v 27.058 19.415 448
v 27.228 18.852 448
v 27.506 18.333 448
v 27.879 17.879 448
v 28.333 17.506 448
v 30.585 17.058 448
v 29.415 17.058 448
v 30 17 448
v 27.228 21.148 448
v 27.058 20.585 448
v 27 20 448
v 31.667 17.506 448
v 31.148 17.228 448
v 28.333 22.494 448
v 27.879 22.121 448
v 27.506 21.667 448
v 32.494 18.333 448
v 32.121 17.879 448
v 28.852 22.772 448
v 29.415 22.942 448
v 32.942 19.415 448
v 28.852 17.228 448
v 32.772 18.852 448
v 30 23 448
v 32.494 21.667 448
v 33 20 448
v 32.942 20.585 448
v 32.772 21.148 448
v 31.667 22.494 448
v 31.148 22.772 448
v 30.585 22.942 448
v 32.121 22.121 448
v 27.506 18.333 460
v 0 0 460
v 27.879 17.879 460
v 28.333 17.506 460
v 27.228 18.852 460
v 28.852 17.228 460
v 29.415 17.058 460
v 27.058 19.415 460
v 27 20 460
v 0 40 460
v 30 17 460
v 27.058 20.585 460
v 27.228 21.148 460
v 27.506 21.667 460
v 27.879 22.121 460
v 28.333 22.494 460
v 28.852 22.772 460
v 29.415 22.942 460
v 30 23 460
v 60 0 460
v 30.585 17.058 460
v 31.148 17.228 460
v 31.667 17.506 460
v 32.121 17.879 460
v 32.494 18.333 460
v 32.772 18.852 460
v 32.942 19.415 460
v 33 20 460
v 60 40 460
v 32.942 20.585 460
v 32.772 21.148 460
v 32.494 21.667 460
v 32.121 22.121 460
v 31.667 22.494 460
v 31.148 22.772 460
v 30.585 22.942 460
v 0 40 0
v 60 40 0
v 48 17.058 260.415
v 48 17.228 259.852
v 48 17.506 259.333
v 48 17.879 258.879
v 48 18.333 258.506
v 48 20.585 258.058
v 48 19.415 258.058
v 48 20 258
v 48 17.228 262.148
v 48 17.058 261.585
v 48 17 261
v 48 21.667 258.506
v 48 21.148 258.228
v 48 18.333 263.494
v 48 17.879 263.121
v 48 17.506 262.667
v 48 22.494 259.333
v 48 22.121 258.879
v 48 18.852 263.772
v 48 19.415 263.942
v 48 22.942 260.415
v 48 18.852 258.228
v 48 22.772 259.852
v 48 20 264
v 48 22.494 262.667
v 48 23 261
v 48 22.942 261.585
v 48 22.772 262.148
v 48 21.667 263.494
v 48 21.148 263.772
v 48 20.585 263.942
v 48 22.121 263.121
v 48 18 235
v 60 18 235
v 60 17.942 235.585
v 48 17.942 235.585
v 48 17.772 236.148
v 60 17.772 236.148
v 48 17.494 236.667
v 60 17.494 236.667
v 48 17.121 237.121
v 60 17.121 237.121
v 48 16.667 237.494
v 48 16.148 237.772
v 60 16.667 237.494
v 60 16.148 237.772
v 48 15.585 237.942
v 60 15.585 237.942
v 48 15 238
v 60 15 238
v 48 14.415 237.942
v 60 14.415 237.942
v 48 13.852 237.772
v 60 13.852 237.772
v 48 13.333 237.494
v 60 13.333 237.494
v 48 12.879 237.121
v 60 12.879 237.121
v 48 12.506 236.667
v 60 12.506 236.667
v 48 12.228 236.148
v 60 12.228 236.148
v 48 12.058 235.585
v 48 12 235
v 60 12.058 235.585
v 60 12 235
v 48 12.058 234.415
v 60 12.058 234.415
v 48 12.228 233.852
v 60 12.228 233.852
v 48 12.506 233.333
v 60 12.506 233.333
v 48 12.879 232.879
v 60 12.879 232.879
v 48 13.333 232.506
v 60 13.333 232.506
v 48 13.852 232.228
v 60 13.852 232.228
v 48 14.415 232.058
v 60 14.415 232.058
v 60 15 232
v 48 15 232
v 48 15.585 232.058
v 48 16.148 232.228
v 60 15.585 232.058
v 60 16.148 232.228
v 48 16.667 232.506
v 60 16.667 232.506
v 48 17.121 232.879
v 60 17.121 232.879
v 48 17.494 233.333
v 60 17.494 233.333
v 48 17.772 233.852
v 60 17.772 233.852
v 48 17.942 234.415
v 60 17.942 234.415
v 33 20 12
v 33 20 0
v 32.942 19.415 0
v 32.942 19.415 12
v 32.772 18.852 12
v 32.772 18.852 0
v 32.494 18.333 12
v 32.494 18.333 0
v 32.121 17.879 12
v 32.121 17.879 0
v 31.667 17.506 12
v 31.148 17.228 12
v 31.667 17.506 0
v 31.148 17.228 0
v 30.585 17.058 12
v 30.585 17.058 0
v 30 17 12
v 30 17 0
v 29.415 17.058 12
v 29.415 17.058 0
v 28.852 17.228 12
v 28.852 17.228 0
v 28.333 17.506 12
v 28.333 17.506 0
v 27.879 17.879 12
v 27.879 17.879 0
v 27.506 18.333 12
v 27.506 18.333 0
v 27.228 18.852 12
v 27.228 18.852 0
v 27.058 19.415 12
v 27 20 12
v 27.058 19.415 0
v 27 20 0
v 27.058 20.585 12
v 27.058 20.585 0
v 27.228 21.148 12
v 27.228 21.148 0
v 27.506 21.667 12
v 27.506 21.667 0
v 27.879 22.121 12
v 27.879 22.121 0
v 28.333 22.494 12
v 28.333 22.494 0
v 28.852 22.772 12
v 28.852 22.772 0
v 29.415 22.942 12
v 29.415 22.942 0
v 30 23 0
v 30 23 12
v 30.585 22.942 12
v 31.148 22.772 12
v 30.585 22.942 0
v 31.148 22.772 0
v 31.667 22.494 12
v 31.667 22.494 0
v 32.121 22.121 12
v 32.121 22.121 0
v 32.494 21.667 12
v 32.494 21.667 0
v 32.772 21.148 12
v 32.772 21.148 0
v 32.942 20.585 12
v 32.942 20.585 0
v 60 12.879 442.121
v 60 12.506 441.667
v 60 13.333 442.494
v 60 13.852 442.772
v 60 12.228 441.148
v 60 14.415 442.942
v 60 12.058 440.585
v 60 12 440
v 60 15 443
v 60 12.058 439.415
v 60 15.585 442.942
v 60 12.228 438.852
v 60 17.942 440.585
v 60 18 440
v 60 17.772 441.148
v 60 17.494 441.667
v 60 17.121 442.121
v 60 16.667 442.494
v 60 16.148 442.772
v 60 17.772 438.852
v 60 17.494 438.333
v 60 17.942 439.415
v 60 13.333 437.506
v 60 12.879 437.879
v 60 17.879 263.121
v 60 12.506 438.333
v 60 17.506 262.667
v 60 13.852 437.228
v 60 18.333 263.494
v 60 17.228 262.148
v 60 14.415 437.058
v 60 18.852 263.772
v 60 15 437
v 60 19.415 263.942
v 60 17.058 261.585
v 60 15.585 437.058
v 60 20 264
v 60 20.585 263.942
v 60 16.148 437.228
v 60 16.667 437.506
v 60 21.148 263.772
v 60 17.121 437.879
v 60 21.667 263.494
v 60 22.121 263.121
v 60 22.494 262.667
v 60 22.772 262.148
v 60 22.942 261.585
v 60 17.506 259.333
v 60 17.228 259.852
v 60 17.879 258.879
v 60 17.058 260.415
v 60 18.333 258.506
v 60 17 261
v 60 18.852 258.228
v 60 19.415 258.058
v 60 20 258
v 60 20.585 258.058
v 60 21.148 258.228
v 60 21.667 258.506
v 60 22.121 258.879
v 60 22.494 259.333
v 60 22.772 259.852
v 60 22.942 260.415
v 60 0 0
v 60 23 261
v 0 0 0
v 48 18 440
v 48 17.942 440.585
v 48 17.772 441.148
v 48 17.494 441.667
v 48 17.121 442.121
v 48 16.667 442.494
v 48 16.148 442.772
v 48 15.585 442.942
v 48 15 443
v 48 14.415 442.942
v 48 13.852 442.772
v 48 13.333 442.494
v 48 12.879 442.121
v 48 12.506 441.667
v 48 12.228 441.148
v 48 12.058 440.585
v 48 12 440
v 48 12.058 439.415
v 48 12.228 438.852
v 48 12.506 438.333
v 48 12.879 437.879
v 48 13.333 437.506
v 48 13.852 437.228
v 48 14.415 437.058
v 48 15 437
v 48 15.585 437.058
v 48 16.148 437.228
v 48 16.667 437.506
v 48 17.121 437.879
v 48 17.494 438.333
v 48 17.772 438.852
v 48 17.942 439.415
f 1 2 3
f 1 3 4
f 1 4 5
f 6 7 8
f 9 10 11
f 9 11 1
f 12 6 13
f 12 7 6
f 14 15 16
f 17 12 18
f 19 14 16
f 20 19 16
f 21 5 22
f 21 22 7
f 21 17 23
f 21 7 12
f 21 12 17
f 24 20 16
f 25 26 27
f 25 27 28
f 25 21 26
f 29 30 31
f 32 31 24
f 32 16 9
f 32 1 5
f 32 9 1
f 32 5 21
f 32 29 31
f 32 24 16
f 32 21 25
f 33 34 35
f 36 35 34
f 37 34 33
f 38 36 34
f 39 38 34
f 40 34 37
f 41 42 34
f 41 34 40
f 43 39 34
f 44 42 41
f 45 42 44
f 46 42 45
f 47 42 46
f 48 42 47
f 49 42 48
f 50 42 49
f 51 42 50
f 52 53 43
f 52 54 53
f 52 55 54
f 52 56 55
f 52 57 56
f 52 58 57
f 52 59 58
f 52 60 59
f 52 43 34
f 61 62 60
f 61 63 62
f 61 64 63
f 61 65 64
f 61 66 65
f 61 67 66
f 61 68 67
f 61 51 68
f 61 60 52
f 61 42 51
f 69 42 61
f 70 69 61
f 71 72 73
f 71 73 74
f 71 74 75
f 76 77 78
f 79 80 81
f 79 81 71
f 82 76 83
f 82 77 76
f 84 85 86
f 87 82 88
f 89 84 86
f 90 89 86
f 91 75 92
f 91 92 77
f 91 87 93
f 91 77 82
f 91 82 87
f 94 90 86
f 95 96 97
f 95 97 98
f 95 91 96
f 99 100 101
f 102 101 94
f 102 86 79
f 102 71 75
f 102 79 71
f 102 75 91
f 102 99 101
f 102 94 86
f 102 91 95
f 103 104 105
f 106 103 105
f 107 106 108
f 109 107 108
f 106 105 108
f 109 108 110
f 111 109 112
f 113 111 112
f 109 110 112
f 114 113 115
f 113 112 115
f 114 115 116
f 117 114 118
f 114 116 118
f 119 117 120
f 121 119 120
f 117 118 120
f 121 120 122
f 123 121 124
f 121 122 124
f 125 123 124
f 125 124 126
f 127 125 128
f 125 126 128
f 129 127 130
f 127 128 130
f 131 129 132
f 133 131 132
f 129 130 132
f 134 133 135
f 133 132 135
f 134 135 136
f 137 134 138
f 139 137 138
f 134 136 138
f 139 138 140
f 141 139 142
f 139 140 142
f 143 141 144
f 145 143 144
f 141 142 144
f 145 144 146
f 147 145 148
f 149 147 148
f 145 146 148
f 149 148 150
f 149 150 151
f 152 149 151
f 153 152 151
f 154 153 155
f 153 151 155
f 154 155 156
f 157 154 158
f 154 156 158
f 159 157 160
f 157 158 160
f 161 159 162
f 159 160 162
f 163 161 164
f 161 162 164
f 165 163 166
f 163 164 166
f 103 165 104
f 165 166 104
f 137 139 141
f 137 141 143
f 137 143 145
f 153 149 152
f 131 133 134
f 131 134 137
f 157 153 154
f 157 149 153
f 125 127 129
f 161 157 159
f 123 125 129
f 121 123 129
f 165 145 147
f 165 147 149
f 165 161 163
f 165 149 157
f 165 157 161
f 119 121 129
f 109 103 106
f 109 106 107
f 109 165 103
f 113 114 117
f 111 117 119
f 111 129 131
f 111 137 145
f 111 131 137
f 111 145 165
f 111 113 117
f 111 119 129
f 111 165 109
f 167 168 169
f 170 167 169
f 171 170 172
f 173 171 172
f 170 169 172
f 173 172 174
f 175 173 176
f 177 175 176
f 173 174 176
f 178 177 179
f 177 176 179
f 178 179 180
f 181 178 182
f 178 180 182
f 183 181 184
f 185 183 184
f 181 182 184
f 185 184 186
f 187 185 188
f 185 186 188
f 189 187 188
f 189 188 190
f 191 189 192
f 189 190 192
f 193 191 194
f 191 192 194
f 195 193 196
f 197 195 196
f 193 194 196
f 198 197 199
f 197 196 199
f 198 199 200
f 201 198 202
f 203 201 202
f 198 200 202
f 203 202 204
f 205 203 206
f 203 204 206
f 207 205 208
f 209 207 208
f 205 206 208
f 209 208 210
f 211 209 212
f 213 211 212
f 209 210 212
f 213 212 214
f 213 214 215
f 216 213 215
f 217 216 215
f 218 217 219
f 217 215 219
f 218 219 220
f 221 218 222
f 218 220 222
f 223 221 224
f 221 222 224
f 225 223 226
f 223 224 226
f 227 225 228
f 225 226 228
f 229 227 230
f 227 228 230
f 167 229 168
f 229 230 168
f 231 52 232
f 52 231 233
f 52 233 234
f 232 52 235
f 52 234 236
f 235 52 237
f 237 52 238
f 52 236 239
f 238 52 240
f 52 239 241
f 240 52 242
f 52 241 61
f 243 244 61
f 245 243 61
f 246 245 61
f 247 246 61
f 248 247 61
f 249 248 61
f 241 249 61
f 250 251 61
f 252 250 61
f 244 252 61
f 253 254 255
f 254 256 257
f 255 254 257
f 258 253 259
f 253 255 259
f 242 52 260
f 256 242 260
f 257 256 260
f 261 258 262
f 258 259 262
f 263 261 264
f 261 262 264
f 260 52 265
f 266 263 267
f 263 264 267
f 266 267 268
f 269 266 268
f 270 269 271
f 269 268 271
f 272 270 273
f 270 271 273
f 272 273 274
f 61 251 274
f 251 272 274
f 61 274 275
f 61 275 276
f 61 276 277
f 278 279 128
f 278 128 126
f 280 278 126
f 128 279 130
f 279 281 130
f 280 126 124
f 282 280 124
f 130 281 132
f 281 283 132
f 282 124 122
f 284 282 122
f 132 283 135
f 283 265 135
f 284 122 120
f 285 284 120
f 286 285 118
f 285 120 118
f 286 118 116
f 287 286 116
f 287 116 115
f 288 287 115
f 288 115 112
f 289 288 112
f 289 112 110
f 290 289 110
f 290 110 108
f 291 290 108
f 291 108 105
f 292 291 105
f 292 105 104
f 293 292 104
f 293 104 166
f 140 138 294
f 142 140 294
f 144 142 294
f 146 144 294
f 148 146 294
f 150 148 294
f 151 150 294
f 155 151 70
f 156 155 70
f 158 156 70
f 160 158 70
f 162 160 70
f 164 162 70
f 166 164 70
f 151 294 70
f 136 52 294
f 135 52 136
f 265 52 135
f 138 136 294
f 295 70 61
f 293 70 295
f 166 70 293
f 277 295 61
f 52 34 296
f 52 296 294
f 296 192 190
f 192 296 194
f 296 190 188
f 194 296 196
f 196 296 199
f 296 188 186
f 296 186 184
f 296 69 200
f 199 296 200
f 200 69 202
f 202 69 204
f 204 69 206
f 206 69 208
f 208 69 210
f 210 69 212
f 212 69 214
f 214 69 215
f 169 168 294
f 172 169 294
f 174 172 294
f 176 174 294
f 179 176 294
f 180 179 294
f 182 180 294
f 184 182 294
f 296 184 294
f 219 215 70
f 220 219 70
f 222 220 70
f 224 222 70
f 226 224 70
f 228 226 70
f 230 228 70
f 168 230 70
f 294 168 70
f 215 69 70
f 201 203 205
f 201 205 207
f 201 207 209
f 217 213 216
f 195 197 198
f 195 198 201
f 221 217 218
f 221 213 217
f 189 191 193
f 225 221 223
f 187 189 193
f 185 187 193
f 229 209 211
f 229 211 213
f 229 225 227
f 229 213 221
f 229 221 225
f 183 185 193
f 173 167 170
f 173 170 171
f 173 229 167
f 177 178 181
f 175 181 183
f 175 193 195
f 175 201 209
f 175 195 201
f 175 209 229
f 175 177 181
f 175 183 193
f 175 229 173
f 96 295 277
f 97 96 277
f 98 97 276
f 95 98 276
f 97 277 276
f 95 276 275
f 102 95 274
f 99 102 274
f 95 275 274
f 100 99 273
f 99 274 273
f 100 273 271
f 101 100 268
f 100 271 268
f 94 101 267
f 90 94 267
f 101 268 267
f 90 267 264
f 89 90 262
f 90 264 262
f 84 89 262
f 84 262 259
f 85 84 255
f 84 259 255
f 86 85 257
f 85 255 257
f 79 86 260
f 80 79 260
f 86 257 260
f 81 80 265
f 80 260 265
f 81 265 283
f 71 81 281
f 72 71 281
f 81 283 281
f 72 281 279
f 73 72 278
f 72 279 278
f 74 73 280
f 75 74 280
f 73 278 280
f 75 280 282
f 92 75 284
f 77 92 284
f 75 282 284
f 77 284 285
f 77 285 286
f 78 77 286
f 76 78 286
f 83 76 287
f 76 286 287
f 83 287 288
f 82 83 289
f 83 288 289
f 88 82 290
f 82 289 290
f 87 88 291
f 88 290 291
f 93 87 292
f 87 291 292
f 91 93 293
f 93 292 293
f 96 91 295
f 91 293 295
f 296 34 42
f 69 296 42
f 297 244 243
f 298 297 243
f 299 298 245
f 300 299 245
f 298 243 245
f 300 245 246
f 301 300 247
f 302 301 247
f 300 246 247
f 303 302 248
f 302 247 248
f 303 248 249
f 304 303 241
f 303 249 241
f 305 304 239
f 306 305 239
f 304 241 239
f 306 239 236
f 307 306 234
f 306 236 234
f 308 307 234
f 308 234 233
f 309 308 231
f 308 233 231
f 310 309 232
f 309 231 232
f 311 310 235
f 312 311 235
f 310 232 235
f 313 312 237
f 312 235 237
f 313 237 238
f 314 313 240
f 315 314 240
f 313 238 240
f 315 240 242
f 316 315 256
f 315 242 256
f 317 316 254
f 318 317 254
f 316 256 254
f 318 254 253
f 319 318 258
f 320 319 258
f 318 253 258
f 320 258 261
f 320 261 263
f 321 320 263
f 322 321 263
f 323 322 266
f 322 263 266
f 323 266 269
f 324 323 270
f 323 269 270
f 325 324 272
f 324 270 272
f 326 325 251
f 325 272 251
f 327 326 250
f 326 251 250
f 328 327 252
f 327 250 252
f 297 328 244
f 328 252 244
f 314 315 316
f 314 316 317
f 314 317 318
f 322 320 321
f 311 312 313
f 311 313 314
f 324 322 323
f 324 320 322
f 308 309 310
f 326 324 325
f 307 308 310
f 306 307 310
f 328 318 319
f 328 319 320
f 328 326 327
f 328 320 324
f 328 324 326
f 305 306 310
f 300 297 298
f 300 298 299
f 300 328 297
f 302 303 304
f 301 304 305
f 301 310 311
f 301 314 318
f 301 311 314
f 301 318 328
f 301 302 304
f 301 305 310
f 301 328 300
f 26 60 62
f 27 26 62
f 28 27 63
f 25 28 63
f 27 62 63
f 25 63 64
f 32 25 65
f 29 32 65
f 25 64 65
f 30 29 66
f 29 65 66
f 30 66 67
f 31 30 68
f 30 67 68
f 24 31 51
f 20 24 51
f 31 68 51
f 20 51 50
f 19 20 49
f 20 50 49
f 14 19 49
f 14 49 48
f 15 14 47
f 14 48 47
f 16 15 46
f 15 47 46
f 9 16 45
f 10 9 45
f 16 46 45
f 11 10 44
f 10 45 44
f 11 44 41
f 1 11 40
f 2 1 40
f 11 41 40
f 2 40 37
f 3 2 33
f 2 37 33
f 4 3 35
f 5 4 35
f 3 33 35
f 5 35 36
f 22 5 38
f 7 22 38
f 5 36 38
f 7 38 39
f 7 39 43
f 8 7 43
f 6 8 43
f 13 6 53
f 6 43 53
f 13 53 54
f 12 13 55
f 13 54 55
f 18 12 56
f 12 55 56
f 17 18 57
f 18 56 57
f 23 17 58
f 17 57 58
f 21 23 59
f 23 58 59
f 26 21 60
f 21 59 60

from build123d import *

# Parameters (mm, degrees)
F0_W      = 60
F0_H      = 40
F1_DEPTH  = 460
F2_R      = 3
F3_DEPTH  = 12
F4_R      = 3
F5_DEPTH  = 12
F6_R      = 3
F7_DEPTH  = 12
F8_R      = 3
F9_DEPTH  = 12
F10_R     = 3
F11_DEPTH = 12


with BuildPart() as f1:
    # F0 (on Top) → F1 (new body)
    with BuildSketch(Plane.XY):
        with Locations((30, 20)):
            Rectangle(F0_W, F0_H)
    extrude(amount=F1_DEPTH)

    # F2 (on face) → F3 (cut)
    with BuildSketch(Plane.XY.offset(460)):
        with Locations((30, 20)):
            Circle(F2_R)
    extrude(amount=-F3_DEPTH, mode=Mode.SUBTRACT)

    # F4 (on face) → F5 (cut)
    with BuildSketch(Plane(origin=(0, 0, 0), x_dir=(1, 0, 0), z_dir=(0, 0, -1))):
        with Locations((30, -20)):
            Circle(F4_R)
    extrude(amount=-F5_DEPTH, mode=Mode.SUBTRACT)

    # F6 (on face) → F7 (cut)
    with BuildSketch(Plane.YZ.offset(60)):
        with Locations((20, 261)):
            Circle(F6_R)
    extrude(amount=-F7_DEPTH, mode=Mode.SUBTRACT)

    # F8 (on face) → F9 (cut)
    with BuildSketch(Plane.YZ.offset(60)):
        with Locations((15, 440)):
            Circle(F8_R)
    extrude(amount=-F9_DEPTH, mode=Mode.SUBTRACT)

    # F10 (on face) → F11 (cut)
    with BuildSketch(Plane.YZ.offset(60)):
        with Locations((15, 235)):
            Circle(F10_R)
    extrude(amount=-F11_DEPTH, mode=Mode.SUBTRACT)


solid = f1.part
